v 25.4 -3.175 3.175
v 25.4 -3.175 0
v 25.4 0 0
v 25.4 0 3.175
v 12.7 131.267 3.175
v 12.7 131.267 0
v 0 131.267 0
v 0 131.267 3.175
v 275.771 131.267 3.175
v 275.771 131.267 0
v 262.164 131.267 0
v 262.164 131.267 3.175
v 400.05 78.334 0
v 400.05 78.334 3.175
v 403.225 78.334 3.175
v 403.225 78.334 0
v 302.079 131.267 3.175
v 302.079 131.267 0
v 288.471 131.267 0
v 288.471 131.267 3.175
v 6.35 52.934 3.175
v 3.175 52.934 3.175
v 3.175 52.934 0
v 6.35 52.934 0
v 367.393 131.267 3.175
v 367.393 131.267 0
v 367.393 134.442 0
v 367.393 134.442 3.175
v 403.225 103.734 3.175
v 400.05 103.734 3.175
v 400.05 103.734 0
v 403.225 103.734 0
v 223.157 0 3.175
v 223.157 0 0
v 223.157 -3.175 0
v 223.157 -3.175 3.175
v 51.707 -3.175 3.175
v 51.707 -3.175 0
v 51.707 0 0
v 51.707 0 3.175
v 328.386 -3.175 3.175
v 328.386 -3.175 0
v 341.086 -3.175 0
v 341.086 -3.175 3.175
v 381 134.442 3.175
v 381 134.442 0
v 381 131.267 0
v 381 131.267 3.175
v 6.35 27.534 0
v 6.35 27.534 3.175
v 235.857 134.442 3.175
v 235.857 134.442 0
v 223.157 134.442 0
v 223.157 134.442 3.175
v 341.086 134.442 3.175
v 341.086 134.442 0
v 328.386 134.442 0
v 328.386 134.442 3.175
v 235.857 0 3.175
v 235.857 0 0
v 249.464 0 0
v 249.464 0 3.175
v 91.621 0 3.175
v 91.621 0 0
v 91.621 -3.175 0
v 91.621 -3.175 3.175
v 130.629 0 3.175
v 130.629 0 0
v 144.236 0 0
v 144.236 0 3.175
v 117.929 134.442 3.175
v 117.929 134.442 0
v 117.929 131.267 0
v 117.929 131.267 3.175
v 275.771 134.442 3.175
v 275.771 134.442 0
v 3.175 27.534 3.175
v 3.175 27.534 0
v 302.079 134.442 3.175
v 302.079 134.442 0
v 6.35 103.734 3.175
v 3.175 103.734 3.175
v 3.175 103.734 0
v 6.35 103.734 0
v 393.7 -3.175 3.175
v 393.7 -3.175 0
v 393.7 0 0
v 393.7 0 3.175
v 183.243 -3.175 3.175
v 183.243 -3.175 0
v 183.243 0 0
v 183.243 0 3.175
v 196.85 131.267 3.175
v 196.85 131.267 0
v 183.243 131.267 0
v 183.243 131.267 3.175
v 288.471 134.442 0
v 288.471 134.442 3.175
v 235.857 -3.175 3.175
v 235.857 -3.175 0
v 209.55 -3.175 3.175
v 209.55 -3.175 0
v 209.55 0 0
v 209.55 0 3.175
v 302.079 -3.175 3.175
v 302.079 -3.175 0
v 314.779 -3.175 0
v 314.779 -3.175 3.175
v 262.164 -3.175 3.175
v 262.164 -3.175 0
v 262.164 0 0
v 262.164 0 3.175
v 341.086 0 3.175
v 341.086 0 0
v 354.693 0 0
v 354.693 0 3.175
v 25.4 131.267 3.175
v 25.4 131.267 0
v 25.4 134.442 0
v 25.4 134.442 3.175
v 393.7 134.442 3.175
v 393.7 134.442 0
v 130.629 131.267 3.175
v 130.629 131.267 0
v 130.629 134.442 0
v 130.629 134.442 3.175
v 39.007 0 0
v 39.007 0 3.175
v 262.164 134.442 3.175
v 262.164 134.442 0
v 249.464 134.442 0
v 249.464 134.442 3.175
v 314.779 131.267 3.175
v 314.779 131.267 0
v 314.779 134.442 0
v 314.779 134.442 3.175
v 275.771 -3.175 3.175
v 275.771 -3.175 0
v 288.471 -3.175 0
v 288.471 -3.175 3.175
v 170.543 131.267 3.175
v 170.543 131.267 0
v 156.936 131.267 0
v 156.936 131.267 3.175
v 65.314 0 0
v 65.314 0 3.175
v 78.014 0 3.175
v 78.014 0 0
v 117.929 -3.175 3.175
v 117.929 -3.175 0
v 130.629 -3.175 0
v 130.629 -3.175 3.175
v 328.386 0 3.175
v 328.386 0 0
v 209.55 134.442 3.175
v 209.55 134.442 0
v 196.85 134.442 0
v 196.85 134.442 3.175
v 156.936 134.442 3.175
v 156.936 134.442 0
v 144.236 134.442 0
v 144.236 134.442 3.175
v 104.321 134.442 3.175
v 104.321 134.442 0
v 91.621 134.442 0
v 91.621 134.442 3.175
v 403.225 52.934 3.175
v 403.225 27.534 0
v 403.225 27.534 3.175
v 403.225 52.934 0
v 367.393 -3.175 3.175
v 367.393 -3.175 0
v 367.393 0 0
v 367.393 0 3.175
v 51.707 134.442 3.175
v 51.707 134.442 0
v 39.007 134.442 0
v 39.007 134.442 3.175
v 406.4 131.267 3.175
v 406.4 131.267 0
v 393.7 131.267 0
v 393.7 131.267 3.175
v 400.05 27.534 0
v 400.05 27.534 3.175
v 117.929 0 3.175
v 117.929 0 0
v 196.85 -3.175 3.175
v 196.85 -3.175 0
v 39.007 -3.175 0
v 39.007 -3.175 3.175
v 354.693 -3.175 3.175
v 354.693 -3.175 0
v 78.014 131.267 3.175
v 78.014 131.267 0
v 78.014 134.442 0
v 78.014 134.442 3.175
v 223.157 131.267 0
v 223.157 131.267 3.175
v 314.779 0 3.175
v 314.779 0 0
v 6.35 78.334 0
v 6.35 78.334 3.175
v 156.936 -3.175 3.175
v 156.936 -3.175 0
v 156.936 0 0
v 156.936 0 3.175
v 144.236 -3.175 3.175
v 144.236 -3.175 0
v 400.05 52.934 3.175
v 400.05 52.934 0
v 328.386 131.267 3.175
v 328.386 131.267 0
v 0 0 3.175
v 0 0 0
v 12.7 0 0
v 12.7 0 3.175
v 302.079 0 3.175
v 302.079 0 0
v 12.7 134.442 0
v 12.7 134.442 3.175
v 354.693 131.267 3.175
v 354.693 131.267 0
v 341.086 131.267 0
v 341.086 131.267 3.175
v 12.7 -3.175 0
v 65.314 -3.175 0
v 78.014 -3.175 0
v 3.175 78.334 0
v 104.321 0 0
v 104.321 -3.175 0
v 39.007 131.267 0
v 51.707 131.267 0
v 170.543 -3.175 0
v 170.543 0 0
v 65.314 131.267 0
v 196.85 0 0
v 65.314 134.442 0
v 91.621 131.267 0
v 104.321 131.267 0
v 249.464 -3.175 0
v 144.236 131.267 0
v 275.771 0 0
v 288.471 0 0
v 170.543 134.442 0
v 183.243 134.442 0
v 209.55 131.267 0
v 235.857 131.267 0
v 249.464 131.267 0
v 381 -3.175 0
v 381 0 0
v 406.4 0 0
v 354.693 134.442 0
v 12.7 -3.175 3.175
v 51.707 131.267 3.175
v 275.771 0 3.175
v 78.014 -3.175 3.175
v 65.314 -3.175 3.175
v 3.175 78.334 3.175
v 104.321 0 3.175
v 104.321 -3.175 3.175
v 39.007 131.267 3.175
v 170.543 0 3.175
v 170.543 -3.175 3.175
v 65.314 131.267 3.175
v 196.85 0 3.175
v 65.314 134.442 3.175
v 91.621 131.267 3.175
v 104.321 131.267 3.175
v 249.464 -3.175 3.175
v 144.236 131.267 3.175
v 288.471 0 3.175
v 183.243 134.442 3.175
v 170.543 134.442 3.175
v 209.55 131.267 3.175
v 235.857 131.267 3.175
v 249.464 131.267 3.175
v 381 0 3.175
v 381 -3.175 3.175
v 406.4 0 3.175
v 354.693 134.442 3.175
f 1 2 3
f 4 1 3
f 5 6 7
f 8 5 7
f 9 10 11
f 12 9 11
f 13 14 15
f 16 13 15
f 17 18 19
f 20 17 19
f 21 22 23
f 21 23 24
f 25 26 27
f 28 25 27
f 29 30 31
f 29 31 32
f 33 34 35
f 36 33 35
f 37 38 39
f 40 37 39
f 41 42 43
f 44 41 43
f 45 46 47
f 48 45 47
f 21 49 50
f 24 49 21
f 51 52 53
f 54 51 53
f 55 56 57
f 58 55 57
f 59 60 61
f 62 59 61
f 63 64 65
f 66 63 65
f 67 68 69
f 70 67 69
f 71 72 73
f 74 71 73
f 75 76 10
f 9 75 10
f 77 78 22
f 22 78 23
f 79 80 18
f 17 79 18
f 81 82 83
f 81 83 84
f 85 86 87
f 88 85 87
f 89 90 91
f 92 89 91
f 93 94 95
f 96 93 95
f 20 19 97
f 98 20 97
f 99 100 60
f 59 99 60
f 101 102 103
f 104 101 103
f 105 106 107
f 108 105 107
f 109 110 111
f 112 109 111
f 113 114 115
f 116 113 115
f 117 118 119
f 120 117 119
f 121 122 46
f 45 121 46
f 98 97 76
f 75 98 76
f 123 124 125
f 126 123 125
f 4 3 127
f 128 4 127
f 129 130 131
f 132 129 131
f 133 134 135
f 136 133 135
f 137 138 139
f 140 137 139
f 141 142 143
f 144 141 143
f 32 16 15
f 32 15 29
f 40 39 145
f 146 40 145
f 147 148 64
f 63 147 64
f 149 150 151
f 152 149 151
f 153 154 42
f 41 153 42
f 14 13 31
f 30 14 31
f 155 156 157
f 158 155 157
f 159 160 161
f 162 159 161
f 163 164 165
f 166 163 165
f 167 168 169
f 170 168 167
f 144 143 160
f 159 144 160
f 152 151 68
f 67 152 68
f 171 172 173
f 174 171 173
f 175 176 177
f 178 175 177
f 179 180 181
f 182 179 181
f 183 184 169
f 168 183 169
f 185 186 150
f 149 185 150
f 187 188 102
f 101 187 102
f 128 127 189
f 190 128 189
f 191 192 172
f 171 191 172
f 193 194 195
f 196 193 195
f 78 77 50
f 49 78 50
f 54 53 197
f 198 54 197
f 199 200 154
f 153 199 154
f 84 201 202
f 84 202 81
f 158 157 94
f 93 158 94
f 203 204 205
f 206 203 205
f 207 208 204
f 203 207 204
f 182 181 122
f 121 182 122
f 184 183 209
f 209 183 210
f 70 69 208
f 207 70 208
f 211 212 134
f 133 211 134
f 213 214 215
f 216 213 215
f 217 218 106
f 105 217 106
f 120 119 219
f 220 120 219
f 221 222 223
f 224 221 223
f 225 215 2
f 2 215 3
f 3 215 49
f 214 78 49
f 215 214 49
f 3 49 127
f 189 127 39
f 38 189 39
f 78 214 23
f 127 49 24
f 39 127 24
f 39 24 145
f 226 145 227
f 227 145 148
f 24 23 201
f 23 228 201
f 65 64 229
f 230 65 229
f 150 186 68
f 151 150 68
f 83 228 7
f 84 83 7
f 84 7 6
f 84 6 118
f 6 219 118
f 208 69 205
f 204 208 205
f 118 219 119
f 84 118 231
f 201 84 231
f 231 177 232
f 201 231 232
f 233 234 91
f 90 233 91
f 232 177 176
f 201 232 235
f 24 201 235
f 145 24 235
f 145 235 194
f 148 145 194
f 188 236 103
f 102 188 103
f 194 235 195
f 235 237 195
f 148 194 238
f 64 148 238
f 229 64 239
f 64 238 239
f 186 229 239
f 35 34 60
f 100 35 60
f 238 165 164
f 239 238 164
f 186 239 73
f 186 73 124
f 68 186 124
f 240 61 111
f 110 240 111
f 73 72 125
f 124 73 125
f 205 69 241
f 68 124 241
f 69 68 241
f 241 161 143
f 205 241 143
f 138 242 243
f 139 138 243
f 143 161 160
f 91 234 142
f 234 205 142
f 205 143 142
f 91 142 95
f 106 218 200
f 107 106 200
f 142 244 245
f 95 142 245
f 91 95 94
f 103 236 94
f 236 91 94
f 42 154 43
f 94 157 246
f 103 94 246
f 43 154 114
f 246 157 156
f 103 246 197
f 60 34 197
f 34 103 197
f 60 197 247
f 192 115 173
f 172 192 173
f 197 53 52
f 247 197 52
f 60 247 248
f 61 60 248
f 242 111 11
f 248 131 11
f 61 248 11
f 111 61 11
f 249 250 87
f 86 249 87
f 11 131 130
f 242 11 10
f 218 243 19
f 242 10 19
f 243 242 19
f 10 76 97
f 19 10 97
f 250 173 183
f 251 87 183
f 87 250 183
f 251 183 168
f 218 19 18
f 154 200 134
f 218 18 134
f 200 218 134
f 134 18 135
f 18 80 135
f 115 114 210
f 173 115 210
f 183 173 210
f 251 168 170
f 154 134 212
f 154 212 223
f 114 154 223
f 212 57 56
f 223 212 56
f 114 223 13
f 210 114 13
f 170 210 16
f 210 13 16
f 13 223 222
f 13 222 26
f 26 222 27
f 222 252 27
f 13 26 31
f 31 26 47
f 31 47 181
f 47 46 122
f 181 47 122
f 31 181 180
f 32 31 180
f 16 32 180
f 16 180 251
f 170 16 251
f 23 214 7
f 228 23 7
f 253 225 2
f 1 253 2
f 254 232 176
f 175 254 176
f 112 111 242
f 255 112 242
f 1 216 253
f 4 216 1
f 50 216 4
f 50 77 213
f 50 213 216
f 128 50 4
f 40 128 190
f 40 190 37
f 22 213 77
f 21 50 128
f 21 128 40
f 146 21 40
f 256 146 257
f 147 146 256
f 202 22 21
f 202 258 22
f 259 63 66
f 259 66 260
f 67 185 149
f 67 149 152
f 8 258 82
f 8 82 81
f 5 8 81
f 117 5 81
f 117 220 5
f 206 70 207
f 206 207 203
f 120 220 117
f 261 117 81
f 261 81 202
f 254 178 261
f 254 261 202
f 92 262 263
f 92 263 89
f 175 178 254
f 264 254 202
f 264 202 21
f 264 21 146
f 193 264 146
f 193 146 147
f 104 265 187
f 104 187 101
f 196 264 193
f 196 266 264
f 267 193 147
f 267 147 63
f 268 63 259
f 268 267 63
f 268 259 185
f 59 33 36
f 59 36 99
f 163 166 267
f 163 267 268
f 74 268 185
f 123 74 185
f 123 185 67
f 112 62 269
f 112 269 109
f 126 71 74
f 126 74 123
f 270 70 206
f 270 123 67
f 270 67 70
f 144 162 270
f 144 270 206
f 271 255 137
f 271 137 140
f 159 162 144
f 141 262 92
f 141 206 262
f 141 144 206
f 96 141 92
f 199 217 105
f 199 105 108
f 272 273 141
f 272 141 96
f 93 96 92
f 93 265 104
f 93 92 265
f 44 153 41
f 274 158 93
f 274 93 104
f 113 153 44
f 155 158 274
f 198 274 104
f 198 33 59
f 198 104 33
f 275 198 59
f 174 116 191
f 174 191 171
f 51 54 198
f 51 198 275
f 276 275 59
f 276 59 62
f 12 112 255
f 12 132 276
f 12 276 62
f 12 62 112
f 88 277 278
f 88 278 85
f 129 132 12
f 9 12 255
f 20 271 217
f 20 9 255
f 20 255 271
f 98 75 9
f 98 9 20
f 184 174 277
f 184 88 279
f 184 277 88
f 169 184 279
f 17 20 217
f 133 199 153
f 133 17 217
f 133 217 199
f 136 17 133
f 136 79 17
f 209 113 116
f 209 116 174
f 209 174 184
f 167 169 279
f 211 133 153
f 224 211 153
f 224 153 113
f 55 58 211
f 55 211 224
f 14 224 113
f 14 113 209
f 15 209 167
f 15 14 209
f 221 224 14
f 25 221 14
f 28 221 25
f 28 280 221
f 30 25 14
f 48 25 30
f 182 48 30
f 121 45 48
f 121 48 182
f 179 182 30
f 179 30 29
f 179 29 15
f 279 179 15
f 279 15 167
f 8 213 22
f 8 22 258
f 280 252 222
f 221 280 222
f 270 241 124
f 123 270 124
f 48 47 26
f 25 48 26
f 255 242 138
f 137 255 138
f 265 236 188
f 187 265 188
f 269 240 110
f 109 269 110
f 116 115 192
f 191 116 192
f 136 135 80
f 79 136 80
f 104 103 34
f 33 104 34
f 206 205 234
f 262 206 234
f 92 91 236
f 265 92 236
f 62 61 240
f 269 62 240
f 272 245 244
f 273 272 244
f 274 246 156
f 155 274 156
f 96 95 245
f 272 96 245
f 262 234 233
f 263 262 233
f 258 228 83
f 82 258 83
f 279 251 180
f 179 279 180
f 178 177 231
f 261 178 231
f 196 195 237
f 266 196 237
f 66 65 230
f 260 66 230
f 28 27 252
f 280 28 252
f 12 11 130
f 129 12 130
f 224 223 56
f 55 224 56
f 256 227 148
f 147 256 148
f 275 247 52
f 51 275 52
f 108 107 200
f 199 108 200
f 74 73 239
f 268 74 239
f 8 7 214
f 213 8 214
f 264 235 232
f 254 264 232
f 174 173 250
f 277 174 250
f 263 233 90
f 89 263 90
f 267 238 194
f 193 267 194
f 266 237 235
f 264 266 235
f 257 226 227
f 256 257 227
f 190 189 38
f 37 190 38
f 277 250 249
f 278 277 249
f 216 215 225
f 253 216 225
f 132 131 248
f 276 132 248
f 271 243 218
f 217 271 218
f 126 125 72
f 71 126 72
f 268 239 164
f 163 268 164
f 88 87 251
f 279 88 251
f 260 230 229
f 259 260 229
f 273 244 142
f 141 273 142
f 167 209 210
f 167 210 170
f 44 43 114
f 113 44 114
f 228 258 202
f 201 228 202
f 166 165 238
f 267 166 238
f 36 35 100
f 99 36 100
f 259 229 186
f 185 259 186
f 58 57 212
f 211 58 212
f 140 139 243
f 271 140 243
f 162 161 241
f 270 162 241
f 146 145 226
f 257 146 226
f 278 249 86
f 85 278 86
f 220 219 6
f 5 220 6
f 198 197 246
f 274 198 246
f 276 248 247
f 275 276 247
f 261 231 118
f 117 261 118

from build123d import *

# Parameters (mm, degrees)
SKETCH1_W           = 3.175
SKETCH1_H           = 25.4
BOSS_EXTRUDE1_DEPTH = 3.175


with BuildPart() as part:
    # Sketch1 → Boss-Extrude1 (new body)
    with BuildSketch(Plane.XY):
        Polygon((406.4, 0), (406.4, 131.2672), (393.7, 131.2672), (393.7, 134.4422), (381, 134.4422), (381, 131.2672), (367.392857143, 131.2672), (367.392857143, 134.4422), (354.692857143, 134.4422), (354.692857143, 131.2672), (341.085714286, 131.2672), (341.085714286, 134.4422), (328.385714286, 134.4422), (328.385714286, 131.2672), (314.778571429, 131.2672), (314.778571429, 134.4422), (302.078571429, 134.4422), (302.078571429, 131.2672), (288.471428571, 131.2672), (288.471428571, 134.4422), (275.771428571, 134.4422), (275.771428571, 131.2672), (262.164285714, 131.2672), (262.164285714, 134.4422), (249.464285714, 134.4422), (249.464285714, 131.2672), (235.857142857, 131.2672), (235.857142857, 134.4422), (223.157142857, 134.4422), (223.157142857, 131.2672), (209.55, 131.2672), (209.55, 134.4422), (196.85, 134.4422), (196.85, 131.2672), (183.242857143, 131.2672), (183.242857143, 134.4422), (170.542857143, 134.4422), (170.542857143, 131.2672), (156.935714286, 131.2672), (156.935714286, 134.4422), (144.235714286, 134.4422), (144.235714286, 131.2672), (130.628571429, 131.2672), (130.628571429, 134.4422), (117.928571429, 134.4422), (117.928571429, 131.2672), (104.321428571, 131.2672), (104.321428571, 134.4422), (91.621428571, 134.4422), (91.621428571, 131.2672), (78.014285714, 131.2672), (78.014285714, 134.4422), (65.314285714, 134.4422), (65.314285714, 131.2672), (51.707142857, 131.2672), (51.707142857, 134.4422), (39.007142857, 134.4422), (39.007142857, 131.2672), (25.4, 131.2672), (25.4, 134.4422), (12.7, 134.4422), (12.7, 131.2672), (0, 131.2672), (0, 0), (12.7, 0), (12.7, -3.175), (25.4, -3.175), (25.4, 0), (39.007142857, 0), (39.007142857, -3.175), (51.707142857, -3.175), (51.707142857, 0), (65.314285714, 0), (65.314285714, -3.175), (78.014285714, -3.175), (78.014285714, 0), (91.621428571, 0), (91.621428571, -3.175), (104.321428571, -3.175), (104.321428571, 0), (117.928571429, 0), (117.928571429, -3.175), (130.628571429, -3.175), (130.628571429, 0), (144.235714286, 0), (144.235714286, -3.175), (156.935714286, -3.175), (156.935714286, 0), (170.542857143, 0), (170.542857143, -3.175), (183.242857143, -3.175), (183.242857143, 0), (196.85, 0), (196.85, -3.175), (209.55, -3.175), (209.55, 0), (223.157142857, 0), (223.157142857, -3.175), (235.857142857, -3.175), (235.857142857, 0), (249.464285714, 0), (249.464285714, -3.175), (262.164285714, -3.175), (262.164285714, 0), (275.771428571, 0), (275.771428571, -3.175), (288.471428571, -3.175), (288.471428571, 0), (302.078571429, 0), (302.078571429, -3.175), (314.778571429, -3.175), (314.778571429, 0), (328.385714286, 0), (328.385714286, -3.175), (341.085714286, -3.175), (341.085714286, 0), (354.692857143, 0), (354.692857143, -3.175), (367.392857143, -3.175), (367.392857143, 0), (381, 0), (381, -3.175), (393.7, -3.175), (393.7, 0), align=None)
        with Locations((4.7625, 91.0336)):
            Rectangle(SKETCH1_W, SKETCH1_H, mode=Mode.SUBTRACT)
        with Locations((4.7625, 40.2336)):
            Rectangle(SKETCH1_W, SKETCH1_H, mode=Mode.SUBTRACT)
        with Locations((401.6375, 91.0336)):
            Rectangle(SKETCH1_W, SKETCH1_H, mode=Mode.SUBTRACT)
        with Locations((401.6375, 40.2336)):
            Rectangle(SKETCH1_W, SKETCH1_H, mode=Mode.SUBTRACT)
    extrude(amount=BOSS_EXTRUDE1_DEPTH)


solid = part.part
